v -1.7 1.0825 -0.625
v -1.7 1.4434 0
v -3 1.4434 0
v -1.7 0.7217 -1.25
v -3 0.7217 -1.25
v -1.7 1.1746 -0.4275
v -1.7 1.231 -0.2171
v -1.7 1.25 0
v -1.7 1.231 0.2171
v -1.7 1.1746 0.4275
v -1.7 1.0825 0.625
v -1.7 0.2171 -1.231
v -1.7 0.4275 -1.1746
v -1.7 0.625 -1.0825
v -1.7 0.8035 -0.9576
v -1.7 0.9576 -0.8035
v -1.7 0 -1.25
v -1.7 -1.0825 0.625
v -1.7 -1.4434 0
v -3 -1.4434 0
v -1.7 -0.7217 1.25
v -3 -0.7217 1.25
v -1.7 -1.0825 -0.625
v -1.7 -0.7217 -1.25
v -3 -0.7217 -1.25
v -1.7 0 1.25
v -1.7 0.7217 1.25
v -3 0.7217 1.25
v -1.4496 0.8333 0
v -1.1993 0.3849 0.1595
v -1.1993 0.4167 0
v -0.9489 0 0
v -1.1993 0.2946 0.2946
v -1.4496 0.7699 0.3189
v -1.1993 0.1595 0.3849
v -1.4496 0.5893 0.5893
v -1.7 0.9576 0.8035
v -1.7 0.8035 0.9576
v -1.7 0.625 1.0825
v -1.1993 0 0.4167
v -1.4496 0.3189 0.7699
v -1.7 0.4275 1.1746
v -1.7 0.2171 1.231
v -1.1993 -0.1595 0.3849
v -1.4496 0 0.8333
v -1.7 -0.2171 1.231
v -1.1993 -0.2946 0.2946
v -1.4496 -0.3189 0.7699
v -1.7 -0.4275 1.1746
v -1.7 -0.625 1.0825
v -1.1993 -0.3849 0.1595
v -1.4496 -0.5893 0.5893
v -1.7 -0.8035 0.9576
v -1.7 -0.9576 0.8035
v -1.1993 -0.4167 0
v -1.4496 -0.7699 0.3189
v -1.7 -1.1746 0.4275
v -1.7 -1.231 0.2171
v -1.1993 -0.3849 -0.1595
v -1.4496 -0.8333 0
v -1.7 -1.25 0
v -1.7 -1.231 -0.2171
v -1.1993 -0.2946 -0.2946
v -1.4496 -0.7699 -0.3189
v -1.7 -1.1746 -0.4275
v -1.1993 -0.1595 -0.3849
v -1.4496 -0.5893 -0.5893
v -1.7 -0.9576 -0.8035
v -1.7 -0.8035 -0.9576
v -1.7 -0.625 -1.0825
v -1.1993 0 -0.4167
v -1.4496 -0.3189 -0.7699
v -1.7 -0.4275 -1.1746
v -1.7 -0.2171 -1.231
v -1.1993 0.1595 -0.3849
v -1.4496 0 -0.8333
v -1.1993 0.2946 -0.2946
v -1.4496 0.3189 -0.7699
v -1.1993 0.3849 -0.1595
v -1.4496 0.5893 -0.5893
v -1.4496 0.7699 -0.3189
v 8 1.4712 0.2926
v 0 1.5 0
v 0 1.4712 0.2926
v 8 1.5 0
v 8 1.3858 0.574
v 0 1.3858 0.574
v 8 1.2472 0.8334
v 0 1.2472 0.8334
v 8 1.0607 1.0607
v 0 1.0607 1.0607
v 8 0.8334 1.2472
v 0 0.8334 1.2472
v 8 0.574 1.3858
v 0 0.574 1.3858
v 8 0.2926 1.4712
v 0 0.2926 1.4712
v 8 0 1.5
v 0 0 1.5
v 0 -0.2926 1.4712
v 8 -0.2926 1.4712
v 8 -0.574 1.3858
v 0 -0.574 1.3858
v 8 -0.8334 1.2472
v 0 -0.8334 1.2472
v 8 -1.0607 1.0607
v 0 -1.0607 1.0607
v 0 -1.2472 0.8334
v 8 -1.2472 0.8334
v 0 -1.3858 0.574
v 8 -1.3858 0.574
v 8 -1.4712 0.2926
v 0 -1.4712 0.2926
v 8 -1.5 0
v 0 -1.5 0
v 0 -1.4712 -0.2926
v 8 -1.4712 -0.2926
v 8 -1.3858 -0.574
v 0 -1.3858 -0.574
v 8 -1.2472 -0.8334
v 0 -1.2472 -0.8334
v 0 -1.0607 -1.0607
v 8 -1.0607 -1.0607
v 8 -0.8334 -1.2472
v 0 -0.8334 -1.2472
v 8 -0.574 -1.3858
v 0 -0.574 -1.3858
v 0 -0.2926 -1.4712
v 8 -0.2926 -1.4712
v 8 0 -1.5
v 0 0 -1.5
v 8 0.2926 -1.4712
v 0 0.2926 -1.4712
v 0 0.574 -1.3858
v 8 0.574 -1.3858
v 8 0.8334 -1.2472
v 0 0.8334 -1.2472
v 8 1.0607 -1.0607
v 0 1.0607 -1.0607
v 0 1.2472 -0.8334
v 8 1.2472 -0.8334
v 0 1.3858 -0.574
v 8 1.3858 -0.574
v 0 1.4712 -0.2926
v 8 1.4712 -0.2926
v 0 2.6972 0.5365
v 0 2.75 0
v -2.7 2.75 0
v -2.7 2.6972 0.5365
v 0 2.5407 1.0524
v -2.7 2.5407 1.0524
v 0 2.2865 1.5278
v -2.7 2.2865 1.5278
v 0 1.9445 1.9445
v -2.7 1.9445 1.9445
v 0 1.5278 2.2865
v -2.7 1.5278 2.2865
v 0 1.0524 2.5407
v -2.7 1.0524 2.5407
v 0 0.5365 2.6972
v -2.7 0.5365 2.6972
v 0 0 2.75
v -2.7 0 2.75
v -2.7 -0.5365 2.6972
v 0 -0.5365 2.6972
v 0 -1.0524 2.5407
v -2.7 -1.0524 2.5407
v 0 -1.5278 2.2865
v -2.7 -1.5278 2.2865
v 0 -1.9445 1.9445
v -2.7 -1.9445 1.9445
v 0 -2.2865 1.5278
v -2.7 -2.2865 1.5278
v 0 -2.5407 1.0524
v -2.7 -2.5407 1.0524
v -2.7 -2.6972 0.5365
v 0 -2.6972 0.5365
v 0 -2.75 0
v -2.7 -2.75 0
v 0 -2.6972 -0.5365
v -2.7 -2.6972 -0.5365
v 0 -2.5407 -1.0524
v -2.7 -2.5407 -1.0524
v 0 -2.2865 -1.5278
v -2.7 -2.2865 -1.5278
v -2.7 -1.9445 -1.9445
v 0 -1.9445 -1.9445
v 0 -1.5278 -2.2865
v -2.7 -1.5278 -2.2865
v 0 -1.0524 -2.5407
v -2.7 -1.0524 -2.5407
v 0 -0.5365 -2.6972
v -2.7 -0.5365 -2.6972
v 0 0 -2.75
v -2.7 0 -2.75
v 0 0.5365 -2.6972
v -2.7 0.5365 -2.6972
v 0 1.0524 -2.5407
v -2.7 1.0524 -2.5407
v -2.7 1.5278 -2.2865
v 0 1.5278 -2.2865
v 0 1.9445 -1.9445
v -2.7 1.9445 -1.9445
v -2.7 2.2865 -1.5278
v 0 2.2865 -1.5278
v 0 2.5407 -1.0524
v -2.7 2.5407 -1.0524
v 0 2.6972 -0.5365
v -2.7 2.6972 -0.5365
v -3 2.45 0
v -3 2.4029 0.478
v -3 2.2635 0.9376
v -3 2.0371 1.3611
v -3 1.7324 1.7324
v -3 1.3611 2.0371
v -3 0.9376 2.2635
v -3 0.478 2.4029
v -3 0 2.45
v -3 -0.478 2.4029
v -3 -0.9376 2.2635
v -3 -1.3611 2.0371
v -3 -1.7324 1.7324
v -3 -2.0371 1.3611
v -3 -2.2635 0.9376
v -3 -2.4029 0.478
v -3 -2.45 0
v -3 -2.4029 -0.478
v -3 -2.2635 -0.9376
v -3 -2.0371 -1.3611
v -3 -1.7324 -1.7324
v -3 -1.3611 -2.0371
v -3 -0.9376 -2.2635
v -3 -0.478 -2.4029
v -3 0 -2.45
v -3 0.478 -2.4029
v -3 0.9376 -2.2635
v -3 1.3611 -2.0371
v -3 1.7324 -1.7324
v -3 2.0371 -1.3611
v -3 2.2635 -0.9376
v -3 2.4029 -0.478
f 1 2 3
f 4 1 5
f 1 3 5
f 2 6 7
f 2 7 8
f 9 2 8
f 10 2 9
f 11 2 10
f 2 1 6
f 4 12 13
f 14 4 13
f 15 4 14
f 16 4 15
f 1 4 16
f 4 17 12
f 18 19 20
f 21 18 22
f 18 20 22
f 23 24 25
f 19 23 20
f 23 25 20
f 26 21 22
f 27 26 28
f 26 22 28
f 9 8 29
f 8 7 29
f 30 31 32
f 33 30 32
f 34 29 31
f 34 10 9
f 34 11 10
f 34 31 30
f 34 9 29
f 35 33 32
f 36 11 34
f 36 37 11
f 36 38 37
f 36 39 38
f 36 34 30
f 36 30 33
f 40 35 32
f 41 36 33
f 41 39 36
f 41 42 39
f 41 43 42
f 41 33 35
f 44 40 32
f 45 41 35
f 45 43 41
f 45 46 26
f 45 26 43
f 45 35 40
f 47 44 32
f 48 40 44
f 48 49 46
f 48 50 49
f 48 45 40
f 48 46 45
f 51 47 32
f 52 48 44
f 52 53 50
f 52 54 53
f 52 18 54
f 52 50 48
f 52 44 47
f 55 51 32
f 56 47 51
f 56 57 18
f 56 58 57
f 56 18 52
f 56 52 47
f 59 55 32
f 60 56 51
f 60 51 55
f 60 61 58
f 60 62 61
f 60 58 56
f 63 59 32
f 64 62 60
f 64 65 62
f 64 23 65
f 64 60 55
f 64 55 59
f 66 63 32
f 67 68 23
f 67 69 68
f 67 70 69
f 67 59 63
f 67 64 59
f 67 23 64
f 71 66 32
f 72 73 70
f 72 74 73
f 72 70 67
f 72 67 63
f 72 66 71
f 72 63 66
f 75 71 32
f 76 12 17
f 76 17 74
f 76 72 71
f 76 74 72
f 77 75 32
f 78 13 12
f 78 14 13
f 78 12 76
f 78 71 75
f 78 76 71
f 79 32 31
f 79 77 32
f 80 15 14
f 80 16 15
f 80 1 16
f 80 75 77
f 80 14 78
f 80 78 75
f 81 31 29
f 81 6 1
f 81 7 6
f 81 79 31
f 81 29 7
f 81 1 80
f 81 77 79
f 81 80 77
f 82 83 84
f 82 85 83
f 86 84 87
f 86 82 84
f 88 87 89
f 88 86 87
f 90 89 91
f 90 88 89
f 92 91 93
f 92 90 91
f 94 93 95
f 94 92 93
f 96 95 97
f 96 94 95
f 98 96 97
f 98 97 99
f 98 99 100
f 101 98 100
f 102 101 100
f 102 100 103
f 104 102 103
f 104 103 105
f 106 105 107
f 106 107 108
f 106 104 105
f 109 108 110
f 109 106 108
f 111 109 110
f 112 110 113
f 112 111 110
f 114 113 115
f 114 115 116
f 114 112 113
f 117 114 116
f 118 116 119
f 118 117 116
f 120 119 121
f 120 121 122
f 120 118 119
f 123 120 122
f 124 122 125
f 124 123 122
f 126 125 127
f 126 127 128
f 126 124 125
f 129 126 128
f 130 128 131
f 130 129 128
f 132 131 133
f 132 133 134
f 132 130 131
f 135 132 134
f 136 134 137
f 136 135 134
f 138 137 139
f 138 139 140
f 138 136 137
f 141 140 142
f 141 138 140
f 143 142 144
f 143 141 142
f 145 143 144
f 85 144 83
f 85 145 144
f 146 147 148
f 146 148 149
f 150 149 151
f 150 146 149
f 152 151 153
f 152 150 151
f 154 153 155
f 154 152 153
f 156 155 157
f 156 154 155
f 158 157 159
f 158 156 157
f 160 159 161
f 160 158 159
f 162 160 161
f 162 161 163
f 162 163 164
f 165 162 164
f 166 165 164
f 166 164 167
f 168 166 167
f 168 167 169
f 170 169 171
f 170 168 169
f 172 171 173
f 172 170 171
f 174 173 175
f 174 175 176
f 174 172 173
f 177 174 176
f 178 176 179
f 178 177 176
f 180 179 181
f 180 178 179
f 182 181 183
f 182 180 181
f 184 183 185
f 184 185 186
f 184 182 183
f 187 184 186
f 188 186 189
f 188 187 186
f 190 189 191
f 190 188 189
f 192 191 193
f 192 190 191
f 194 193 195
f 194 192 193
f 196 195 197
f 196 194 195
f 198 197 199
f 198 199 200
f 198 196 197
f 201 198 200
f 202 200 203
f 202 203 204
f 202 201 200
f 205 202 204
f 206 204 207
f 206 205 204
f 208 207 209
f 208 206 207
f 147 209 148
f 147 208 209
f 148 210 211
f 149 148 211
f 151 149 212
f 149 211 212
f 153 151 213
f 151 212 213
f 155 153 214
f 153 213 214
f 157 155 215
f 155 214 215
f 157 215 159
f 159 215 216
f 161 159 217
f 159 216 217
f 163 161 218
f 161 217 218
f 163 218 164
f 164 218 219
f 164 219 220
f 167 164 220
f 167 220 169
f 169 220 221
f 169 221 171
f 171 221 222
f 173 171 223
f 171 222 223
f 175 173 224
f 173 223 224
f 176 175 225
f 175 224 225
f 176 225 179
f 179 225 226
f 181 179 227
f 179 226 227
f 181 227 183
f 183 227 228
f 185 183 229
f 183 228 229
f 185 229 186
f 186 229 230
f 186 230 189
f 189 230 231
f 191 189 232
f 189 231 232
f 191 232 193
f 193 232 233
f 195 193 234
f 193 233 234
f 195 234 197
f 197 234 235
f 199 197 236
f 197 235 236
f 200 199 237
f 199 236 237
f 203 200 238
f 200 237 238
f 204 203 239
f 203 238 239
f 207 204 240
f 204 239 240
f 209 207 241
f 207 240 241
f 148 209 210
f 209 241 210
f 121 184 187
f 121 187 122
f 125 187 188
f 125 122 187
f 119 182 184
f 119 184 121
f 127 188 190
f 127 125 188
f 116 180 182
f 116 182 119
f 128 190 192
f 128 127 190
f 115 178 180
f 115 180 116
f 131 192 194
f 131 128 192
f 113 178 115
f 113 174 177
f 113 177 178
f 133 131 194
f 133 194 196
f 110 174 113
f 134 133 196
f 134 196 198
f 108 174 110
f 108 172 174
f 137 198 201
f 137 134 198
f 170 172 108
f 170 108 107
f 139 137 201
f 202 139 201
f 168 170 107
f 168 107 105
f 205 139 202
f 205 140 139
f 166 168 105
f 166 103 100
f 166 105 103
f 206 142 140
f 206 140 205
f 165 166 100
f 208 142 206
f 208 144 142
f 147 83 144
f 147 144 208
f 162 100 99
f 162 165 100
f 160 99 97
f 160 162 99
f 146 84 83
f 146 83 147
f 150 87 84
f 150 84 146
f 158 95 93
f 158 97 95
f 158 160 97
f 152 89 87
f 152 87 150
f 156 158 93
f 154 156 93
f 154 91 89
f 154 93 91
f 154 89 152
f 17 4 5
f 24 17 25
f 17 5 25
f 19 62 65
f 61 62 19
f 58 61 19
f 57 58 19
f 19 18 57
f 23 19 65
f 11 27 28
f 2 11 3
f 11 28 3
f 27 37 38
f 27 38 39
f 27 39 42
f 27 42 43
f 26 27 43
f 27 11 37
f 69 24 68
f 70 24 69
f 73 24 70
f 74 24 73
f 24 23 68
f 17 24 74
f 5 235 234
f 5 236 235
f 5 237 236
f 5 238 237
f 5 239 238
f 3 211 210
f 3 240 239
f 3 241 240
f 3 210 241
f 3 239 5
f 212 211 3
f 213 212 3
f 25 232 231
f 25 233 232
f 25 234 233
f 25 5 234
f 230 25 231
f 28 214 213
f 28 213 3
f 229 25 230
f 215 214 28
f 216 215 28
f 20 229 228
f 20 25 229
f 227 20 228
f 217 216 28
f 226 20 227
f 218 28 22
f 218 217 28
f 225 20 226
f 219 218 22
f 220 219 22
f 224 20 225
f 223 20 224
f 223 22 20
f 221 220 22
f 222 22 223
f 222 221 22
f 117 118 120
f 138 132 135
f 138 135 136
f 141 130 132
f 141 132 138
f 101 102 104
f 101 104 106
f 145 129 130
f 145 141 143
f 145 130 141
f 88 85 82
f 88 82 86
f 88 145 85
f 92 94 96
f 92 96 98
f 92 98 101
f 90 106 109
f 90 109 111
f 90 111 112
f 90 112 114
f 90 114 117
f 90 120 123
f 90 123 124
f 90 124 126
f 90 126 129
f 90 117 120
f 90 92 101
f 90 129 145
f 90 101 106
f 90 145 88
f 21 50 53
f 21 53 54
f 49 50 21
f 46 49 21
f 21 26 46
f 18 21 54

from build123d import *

# Parameters (mm, degrees)
CUT_EXTRUDE1_DEPTH = 1.3
CHAMFER1_SIZE      = 0.3


with BuildPart() as part:
    # Sketch1 → Revolve1 (revolve)
    with BuildSketch(Plane.XY):
        Polygon((0, 1.5), (8, 1.5), (8, 0), (-3, 0), (-3, 2.75), (0, 2.75), align=None)
    revolve(axis=Axis((-3, 0, 0), (1, 0, 0)))

    # Sketch2 → Cut-Revolve1 (revolve, cut)
    with BuildSketch(Plane.XY):
        Polygon((-0.948924226, 0), (-1.7, 1.25), (-3, 1.25), (-3, 0), align=None)
    revolve(axis=Axis((-3, 0, 0), (1, 0, 0)), mode=Mode.SUBTRACT)

    # Sketch3 → Cut-Extrude1 (cut)
    with BuildSketch(Plane.ZY.offset(3)):
        Polygon((1.25, 0.721687836), (0, 1.443375673), (-1.25, 0.721687836), (-1.25, -0.721687836), (0, -1.443375673), (1.25, -0.721687836), align=None)
    extrude(amount=-CUT_EXTRUDE1_DEPTH, mode=Mode.SUBTRACT)

    # Chamfer1
    chamfer1_edges = [part.edges().sort_by_distance(p)[0] for p in [
        (-3, -2.75, 0),
    ]]
    chamfer(chamfer1_edges, length=CHAMFER1_SIZE)


solid = part.part
